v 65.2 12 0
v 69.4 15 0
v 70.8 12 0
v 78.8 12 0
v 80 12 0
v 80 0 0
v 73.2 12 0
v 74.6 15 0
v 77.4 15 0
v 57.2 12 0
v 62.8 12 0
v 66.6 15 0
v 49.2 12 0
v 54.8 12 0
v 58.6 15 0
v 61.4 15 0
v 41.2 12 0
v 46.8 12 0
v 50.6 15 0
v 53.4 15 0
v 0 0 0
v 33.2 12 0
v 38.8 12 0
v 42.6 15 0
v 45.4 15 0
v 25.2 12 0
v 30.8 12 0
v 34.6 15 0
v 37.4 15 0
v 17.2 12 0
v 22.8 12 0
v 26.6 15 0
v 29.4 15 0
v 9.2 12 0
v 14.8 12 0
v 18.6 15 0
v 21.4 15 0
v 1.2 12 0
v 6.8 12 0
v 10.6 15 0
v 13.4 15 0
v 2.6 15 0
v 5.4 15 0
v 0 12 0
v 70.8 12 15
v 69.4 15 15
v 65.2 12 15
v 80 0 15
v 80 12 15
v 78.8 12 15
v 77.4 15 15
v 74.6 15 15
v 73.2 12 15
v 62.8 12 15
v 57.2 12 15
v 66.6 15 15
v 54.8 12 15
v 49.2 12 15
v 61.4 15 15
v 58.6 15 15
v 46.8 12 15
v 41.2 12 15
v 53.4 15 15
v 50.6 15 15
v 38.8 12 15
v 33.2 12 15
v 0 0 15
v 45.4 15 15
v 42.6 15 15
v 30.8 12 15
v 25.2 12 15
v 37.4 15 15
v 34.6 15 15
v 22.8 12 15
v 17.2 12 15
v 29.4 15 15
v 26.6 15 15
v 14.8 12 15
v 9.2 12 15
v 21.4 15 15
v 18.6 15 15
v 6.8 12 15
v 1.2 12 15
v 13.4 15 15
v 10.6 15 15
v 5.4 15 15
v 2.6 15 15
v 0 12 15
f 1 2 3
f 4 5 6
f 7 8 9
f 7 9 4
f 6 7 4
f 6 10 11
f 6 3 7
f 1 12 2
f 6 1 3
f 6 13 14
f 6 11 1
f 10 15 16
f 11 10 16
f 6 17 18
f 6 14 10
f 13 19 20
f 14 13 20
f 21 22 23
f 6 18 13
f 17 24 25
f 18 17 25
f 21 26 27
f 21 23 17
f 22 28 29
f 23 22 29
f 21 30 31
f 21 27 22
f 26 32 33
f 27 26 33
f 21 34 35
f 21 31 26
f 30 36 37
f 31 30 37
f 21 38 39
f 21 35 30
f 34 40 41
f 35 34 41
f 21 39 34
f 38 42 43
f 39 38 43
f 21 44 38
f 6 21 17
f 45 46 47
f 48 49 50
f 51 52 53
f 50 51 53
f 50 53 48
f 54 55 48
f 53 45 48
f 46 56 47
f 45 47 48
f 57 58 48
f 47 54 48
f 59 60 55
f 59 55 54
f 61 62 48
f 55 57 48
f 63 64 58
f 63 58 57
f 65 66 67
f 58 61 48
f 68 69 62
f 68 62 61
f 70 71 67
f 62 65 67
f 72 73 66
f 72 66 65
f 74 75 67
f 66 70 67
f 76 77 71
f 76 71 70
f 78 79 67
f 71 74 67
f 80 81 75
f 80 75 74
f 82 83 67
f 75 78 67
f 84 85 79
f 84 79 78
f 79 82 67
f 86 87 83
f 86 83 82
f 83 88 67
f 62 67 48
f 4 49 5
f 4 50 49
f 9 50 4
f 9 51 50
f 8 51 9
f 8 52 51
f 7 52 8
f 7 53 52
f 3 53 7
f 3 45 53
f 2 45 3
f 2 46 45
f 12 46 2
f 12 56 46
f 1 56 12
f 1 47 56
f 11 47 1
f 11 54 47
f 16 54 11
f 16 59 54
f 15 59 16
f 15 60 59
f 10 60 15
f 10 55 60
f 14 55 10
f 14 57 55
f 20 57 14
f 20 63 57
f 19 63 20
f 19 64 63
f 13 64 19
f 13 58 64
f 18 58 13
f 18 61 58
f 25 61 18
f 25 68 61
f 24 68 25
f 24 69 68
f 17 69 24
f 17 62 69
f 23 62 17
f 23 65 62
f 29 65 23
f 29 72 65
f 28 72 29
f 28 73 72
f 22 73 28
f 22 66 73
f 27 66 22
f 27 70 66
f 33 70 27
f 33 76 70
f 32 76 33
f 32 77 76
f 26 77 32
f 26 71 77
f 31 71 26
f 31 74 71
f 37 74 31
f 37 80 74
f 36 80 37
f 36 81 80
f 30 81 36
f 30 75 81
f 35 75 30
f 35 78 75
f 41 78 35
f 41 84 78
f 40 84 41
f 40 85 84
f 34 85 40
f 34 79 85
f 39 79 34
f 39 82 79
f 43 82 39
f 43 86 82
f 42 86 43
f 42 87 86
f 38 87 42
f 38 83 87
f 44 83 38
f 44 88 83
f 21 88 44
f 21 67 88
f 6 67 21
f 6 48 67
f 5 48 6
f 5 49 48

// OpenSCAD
$fn = 32;

// ----------------------------------------------------------------------
// Gear rack: 10 teeth, pitch 8 mm
// ----------------------------------------------------------------------

// --- parameters (mm) ---
teeth = 10;               // number of teeth
pitch = 8;                // tooth pitch, X
root_w = 5.6;             // tooth width at the root
tip_w = 2.8;              // tooth width at the tip
base_h = 12;              // rack body height, Y
tooth_h = 3;              // tooth height above the body
plate_t = 15;             // rack width, Z (extrusion height)
fit_tol = 0.05;           // declared fit tolerance (prompt contract)
free_tol = 0.3;           // declared free tolerance (prompt contract)

rack_l = teeth * pitch;  // overall length
total_h = base_h + tooth_h;  // overall height

profile = [[0, 0], [80, 0], [80, 12], [78.8, 12], [77.4, 15], [74.6, 15], [73.2, 12], [70.8, 12], [69.4, 15], [66.6, 15], [65.2, 12], [62.8, 12], [61.4, 15], [58.6, 15], [57.2, 12], [54.8, 12], [53.4, 15], [50.6, 15], [49.2, 12], [46.8, 12], [45.4, 15], [42.6, 15], [41.2, 12], [38.8, 12], [37.4, 15], [34.6, 15], [33.2, 12], [30.8, 12], [29.4, 15], [26.6, 15], [25.2, 12], [22.8, 12], [21.4, 15], [18.6, 15], [17.2, 12], [14.8, 12], [13.4, 15], [10.6, 15], [9.2, 12], [6.8, 12], [5.4, 15], [2.6, 15], [1.2, 12], [0, 12]];  // primary outline, 44 points, counter clockwise

// --- the one profile operation ---
linear_extrude(height = plate_t) polygon(points = profile);
